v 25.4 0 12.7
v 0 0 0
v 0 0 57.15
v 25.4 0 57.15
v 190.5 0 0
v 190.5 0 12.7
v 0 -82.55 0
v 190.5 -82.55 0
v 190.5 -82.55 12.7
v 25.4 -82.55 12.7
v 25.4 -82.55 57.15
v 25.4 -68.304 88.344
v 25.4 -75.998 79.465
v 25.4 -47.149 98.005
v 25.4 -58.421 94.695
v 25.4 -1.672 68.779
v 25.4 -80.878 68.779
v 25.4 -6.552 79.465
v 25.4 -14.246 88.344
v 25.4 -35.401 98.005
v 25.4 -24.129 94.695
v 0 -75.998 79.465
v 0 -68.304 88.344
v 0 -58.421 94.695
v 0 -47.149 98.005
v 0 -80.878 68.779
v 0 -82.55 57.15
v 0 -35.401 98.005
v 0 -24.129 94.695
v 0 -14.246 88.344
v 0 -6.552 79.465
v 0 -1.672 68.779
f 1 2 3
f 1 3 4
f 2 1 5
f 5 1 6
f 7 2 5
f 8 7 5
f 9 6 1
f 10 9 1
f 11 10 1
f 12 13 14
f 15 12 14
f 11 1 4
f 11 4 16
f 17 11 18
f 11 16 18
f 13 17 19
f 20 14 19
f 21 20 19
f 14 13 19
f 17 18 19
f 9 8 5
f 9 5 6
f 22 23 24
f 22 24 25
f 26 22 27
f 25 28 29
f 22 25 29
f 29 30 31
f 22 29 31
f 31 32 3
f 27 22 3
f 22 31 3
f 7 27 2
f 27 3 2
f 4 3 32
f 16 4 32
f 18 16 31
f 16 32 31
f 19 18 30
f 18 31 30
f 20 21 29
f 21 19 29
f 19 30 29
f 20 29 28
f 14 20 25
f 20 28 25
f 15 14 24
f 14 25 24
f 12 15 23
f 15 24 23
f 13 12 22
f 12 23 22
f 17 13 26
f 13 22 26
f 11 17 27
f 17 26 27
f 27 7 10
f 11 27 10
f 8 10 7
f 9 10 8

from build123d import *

# Parameters (mm, degrees)
F1_DEPTH = 82.55
F3_DEPTH = 190.501


with BuildPart() as f1:
    # F0 (on Front) → F1 (new body)
    with BuildSketch(Plane.XZ):
        Polygon((0, 156.757593), (0, 0), (190.5, 0), (190.5, 12.7), (25.4, 12.7), (25.4, 156.757593), align=None)
    extrude(amount=F1_DEPTH)

    # F2 (on face) → F3 (cut, through all)
    with BuildSketch(Plane(origin=(0, 0, 0), x_dir=(0, -1, 0), z_dir=(-1, 0, 0))):
        with BuildLine():
            ThreePointArc((0, 57.15), (41.275, 98.425), (82.55, 57.15))
            Line((82.55, 57.15), (82.55, 156.757593))
            Line((82.55, 156.757593), (0, 156.757593))
            Line((0, 156.757593), (0, 57.15))
        make_face()
    extrude(amount=-F3_DEPTH, mode=Mode.SUBTRACT)


solid = f1.part
